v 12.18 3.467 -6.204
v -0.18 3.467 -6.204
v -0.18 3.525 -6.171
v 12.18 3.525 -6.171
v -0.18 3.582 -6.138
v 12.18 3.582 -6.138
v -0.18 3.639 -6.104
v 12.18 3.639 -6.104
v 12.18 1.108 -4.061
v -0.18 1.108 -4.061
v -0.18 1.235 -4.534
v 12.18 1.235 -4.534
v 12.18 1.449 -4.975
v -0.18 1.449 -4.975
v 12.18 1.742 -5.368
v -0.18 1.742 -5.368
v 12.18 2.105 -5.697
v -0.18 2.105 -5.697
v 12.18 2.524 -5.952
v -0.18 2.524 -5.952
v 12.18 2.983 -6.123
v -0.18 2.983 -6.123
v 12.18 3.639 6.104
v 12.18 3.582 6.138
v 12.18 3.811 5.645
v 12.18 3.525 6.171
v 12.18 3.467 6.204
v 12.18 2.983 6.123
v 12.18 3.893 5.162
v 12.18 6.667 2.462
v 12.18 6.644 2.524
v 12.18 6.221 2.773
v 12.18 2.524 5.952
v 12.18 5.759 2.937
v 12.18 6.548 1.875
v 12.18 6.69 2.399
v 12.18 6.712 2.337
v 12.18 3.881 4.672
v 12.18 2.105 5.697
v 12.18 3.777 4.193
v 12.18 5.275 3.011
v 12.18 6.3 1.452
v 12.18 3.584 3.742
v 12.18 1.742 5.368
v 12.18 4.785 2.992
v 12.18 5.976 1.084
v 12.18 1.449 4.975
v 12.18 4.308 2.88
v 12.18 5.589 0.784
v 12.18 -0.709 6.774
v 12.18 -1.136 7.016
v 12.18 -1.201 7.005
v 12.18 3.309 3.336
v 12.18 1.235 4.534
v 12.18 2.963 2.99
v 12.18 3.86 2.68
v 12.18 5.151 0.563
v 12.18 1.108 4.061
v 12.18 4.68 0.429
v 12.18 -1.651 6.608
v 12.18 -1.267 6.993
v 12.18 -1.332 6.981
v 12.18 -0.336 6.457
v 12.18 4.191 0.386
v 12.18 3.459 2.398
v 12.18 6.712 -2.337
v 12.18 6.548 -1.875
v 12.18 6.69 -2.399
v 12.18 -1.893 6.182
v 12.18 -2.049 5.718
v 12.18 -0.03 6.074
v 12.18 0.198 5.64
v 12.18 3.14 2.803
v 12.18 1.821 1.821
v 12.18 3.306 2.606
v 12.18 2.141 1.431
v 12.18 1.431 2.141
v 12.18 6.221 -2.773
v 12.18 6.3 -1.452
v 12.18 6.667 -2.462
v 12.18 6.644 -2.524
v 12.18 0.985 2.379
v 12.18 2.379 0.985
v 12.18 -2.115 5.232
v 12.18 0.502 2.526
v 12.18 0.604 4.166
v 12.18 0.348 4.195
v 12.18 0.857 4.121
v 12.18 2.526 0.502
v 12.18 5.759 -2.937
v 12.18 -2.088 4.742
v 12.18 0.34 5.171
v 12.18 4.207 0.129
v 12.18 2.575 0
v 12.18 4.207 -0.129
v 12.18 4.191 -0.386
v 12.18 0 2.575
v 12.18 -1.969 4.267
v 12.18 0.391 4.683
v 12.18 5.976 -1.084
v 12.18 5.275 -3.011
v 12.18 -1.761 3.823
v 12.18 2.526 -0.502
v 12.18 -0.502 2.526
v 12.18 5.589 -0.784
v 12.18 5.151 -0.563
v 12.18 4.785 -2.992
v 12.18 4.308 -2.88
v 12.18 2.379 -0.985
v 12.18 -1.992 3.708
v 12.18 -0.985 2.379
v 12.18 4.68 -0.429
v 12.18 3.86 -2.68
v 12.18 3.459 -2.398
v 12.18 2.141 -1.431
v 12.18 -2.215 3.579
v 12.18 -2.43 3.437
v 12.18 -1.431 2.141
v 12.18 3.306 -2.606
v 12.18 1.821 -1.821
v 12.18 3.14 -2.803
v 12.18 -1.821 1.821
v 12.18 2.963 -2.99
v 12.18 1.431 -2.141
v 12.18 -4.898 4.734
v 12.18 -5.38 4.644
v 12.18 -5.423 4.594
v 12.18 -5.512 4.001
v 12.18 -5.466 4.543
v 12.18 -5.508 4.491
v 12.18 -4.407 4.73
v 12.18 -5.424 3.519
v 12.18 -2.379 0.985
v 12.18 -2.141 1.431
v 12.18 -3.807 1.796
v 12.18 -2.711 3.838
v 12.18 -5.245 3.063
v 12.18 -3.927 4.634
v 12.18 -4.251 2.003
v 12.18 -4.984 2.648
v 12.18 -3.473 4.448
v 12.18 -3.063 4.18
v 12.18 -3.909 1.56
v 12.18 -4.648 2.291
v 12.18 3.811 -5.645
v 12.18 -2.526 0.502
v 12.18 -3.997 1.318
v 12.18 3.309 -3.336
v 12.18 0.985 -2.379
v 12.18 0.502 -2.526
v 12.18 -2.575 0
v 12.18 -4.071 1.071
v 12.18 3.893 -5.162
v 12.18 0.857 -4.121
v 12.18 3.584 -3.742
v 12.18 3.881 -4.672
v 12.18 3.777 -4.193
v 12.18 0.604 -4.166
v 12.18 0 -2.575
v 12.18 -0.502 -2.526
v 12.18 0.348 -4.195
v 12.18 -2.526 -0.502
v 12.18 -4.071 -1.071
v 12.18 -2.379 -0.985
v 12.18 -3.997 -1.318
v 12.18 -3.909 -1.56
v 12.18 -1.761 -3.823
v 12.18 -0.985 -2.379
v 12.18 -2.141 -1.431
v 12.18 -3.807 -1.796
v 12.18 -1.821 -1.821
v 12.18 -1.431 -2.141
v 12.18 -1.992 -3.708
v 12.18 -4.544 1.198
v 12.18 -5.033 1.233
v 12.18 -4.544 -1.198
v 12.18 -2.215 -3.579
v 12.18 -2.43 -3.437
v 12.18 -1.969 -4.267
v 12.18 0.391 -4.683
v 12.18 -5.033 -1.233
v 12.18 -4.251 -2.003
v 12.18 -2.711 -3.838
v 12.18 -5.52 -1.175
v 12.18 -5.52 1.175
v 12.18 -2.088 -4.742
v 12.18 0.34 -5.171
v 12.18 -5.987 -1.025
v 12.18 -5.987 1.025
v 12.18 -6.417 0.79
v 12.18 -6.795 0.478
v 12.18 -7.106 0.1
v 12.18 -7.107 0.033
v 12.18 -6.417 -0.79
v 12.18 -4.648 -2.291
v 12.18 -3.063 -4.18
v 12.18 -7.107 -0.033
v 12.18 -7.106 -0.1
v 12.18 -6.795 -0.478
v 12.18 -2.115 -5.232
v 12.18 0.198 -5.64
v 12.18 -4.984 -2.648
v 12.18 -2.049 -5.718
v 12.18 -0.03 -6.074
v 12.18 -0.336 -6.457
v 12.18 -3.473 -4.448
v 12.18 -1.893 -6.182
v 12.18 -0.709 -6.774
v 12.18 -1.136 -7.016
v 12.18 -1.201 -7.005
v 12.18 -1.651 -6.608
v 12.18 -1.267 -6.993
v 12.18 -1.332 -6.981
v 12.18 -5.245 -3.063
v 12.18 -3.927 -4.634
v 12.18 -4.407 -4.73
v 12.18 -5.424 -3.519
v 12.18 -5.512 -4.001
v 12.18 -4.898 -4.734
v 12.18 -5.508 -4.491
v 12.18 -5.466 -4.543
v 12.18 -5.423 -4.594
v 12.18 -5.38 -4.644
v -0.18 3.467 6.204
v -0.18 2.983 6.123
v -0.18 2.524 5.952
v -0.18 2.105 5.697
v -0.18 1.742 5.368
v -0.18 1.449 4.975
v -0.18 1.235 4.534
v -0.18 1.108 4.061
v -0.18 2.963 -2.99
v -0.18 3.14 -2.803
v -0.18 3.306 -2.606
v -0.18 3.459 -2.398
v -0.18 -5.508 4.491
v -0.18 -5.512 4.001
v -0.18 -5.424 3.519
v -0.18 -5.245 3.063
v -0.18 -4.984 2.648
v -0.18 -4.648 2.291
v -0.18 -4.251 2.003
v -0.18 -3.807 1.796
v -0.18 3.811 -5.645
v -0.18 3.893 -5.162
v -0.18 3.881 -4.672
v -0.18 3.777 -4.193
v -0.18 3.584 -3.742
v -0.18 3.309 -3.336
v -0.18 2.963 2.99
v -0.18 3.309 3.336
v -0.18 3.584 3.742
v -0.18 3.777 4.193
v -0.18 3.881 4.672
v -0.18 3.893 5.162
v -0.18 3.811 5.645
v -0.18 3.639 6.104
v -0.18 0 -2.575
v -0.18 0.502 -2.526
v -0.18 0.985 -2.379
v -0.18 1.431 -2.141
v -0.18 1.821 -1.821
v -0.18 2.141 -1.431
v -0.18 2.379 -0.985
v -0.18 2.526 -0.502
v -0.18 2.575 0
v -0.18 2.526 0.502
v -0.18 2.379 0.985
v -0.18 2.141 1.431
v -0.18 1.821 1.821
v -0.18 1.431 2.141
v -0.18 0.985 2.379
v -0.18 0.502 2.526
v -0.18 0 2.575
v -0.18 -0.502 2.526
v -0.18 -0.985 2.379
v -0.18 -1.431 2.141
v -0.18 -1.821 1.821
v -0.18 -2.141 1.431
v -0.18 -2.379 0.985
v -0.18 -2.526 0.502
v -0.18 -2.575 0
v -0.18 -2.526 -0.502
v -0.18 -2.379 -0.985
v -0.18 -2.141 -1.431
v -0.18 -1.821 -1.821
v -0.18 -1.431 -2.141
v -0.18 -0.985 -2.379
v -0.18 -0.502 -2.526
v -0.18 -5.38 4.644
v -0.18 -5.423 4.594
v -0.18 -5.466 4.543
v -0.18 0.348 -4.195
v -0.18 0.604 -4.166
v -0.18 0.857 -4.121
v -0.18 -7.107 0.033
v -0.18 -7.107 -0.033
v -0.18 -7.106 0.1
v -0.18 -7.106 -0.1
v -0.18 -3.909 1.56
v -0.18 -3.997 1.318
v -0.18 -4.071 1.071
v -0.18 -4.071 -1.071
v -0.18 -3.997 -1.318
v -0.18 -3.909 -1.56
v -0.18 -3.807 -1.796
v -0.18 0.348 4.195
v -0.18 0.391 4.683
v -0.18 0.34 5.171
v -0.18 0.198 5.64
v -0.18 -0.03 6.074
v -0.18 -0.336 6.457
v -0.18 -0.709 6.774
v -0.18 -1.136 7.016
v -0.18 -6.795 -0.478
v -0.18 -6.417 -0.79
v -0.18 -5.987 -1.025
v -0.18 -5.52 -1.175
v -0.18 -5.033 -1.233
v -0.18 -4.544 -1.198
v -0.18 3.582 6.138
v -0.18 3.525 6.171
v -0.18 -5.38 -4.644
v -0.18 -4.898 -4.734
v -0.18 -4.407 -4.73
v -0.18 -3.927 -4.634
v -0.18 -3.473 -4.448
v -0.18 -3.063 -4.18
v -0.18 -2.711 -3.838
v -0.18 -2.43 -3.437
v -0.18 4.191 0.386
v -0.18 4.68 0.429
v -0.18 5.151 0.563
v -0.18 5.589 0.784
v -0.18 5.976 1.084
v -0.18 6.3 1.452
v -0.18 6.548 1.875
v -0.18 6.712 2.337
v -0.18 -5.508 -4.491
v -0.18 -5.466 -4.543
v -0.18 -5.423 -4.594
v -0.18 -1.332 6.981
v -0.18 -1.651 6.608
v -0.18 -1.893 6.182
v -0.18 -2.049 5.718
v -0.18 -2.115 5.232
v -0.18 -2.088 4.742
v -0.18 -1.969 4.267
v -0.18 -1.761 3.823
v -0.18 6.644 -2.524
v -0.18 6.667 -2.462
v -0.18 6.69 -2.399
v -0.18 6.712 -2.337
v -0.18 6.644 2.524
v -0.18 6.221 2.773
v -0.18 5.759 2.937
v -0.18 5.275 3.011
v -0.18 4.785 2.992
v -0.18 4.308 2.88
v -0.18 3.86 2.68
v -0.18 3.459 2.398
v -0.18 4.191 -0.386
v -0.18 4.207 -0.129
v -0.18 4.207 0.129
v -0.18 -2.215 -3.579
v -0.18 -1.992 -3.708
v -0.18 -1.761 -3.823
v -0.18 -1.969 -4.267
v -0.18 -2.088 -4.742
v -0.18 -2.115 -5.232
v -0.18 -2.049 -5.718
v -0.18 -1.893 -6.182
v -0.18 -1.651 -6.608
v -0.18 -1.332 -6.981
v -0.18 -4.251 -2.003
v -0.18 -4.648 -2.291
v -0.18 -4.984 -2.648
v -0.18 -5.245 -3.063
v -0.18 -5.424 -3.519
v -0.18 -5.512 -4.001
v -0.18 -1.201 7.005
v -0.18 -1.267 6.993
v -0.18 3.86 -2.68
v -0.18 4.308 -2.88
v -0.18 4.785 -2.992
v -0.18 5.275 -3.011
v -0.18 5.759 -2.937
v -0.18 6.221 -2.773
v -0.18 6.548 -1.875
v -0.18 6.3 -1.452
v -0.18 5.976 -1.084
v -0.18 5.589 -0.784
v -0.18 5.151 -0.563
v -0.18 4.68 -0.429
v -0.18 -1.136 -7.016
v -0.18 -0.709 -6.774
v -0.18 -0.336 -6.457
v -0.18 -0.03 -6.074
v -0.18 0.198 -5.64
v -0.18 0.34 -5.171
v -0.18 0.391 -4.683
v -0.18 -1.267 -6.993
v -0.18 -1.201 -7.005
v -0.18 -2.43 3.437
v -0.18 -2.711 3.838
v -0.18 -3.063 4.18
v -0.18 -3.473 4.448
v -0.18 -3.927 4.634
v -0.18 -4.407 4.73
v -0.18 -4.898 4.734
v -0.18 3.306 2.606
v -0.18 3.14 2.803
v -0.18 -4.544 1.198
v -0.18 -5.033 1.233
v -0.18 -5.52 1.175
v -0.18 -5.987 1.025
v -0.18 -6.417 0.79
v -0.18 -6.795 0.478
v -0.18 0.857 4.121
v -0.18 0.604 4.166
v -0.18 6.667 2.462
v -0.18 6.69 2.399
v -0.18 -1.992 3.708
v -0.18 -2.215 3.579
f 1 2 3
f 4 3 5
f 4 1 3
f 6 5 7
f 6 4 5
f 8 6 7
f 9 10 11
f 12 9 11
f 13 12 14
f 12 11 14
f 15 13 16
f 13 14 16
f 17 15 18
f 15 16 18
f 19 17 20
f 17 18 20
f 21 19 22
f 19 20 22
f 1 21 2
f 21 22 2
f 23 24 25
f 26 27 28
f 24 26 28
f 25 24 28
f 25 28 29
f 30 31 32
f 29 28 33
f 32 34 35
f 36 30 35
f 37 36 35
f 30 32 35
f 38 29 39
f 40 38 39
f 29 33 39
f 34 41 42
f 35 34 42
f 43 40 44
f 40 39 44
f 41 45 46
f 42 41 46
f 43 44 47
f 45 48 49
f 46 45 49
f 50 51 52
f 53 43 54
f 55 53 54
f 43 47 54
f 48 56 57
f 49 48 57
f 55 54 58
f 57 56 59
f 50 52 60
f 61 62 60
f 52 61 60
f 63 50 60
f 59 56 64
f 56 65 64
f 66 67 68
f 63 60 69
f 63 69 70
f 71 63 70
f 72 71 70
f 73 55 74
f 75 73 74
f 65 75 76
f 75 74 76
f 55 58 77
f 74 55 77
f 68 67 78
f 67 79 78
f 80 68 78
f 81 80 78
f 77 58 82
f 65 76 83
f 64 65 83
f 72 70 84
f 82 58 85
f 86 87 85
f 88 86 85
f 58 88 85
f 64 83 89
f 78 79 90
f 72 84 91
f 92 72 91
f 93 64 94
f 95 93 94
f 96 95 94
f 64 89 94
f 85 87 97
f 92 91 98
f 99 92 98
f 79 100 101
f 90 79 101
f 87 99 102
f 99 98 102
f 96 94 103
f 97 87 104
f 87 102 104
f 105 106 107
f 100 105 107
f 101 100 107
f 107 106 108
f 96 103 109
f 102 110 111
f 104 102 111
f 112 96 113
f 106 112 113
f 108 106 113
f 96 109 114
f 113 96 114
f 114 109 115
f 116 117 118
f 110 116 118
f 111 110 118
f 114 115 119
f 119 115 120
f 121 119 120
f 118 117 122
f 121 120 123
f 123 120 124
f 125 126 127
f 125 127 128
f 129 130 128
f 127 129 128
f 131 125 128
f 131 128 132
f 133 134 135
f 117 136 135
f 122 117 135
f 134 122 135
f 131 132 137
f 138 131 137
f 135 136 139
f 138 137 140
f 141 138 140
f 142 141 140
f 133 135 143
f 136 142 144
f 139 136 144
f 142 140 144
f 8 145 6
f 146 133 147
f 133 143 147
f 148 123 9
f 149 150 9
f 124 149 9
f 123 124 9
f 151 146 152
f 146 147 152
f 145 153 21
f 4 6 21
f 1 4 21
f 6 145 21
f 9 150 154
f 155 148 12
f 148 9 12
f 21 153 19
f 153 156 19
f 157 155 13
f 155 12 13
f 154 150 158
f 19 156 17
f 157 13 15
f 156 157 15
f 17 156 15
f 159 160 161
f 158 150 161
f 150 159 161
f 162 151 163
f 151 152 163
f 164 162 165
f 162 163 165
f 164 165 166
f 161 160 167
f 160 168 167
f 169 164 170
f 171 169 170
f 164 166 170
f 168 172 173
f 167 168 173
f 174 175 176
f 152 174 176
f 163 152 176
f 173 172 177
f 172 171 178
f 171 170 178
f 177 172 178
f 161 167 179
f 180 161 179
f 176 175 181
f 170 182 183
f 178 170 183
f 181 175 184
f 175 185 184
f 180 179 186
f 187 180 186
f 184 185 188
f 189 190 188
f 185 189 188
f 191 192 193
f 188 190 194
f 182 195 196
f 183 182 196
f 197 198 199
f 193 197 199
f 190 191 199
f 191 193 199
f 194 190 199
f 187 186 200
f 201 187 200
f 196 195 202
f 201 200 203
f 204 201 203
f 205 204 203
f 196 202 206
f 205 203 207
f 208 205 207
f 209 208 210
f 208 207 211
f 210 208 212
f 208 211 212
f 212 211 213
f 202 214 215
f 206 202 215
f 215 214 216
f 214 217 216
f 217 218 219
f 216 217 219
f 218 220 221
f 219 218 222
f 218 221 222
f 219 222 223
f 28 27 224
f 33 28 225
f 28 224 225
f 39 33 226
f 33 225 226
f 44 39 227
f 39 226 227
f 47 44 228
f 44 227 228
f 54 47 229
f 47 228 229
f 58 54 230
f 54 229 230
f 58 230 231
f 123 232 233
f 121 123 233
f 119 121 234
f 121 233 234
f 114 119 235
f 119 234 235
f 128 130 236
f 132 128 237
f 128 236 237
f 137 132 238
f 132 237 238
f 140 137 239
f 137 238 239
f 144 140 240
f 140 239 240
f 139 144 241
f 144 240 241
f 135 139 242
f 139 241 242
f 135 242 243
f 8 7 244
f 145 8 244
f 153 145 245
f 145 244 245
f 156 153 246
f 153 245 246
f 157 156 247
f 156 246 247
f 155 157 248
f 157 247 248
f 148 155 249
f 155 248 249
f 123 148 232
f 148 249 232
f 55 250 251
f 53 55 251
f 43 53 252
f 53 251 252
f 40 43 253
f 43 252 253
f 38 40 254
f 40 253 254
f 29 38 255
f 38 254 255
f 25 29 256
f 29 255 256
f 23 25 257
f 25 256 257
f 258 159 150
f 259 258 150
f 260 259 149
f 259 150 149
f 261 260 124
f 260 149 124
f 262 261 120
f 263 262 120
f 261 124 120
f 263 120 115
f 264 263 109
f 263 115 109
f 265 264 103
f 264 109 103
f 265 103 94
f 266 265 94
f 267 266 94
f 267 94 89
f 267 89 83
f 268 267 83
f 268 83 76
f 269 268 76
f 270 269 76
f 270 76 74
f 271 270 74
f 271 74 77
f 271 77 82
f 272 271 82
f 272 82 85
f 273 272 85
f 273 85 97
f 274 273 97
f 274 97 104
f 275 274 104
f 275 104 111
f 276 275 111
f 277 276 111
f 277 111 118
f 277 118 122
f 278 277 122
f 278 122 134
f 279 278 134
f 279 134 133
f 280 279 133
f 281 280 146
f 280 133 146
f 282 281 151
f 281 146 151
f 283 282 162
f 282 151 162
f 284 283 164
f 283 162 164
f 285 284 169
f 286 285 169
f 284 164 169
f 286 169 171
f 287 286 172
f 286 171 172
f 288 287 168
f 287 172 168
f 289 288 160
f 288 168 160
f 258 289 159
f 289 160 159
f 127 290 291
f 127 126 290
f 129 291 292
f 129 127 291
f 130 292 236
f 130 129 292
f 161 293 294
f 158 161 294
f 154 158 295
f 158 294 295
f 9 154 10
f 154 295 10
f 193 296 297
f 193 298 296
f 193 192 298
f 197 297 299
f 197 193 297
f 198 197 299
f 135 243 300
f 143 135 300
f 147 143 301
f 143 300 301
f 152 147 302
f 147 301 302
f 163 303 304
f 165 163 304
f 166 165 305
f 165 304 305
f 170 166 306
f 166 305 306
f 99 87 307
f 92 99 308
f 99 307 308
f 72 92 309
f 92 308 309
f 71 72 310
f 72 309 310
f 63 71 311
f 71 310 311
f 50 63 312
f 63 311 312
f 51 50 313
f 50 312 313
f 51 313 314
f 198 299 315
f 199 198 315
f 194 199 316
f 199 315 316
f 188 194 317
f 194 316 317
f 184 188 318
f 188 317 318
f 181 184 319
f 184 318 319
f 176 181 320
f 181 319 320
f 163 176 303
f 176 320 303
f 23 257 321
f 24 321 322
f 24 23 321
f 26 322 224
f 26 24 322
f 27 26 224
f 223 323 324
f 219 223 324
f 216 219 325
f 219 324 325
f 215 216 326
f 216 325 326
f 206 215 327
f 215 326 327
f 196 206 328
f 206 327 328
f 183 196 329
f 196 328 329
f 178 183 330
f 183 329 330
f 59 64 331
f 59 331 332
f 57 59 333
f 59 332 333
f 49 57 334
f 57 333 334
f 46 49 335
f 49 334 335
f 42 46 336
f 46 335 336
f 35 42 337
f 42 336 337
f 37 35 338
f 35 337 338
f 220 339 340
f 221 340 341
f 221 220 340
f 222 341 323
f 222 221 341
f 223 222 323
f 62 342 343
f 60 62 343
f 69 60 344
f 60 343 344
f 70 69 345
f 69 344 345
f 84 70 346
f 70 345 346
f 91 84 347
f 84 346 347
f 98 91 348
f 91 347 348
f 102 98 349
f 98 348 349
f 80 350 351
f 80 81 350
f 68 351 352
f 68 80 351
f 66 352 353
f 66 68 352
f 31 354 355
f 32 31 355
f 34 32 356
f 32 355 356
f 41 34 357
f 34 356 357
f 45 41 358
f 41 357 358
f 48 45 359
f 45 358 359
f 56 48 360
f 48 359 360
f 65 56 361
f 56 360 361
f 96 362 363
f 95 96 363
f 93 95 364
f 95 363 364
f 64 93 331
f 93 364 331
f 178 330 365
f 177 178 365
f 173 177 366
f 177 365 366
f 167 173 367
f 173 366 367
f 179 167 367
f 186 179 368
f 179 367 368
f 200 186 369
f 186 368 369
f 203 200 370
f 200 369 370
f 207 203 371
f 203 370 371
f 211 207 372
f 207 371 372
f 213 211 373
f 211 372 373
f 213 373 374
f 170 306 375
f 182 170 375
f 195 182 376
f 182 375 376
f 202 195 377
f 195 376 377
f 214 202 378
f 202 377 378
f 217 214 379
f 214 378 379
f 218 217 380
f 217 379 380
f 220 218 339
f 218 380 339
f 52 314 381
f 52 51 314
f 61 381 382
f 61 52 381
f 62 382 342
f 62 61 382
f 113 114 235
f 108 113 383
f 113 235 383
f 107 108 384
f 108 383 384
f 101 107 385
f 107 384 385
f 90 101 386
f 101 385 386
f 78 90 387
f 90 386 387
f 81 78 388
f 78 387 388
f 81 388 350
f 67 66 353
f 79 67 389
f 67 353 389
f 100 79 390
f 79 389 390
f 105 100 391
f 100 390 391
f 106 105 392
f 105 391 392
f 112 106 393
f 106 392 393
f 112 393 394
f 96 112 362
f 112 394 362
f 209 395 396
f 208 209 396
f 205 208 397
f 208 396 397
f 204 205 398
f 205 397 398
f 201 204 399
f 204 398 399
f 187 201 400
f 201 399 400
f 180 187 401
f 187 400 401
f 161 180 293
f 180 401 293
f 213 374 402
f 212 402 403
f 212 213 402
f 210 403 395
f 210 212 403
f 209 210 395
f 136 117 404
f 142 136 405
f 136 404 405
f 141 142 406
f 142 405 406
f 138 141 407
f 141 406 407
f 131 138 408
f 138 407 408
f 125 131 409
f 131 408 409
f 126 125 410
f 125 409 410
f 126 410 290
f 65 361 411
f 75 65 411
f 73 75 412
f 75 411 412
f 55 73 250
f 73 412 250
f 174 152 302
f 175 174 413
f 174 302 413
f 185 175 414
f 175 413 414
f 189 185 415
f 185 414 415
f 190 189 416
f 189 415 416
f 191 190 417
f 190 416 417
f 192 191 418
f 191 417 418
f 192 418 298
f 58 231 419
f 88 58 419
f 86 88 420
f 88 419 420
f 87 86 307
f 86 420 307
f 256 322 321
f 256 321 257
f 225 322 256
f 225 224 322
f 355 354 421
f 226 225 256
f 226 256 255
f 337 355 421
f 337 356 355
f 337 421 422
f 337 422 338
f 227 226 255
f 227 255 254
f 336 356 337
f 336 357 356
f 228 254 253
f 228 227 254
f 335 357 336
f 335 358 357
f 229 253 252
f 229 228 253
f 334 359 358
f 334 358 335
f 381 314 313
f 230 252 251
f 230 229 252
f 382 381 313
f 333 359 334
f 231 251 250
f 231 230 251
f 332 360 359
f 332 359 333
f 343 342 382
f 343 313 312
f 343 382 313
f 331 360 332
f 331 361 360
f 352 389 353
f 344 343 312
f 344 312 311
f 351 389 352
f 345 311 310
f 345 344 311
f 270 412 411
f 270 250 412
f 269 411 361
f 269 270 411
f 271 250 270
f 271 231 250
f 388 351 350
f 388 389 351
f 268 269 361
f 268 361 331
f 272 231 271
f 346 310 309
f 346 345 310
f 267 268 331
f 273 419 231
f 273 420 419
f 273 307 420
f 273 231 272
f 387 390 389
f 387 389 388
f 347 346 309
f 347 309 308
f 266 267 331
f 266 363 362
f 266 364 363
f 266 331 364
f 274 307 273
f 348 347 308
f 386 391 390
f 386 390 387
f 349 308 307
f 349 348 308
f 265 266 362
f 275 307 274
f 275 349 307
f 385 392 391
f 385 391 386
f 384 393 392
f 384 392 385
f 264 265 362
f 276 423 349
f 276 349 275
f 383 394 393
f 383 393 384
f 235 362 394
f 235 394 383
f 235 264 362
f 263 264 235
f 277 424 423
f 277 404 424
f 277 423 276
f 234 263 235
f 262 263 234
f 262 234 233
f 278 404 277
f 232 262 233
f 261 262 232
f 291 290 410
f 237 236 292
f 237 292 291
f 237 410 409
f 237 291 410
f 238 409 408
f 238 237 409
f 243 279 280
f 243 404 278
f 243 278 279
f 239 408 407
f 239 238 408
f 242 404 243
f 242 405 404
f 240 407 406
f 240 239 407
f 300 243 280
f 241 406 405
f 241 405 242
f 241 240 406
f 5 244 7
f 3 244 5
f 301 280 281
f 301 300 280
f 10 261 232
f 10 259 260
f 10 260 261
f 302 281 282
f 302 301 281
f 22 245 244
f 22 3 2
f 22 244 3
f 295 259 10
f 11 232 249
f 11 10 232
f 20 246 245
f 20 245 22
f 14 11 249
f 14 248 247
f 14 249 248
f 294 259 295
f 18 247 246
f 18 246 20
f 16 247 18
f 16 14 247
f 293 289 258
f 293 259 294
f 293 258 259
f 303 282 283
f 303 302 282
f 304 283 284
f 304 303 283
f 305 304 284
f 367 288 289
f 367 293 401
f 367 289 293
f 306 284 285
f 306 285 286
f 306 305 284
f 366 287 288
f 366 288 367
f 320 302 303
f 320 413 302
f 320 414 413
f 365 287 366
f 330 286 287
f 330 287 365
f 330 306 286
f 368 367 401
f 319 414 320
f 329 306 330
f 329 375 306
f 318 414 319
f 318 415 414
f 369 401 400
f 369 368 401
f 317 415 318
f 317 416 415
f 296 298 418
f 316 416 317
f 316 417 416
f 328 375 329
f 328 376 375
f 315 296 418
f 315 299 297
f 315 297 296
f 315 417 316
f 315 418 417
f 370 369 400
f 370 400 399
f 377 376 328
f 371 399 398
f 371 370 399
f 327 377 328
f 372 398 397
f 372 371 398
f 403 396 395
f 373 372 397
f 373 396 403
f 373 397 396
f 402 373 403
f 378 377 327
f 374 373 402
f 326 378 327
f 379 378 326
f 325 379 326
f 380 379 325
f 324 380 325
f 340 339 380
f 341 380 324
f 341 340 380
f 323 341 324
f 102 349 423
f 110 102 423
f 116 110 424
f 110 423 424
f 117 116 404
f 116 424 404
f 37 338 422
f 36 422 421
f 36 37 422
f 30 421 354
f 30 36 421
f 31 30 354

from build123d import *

# Parameters (mm, degrees)
BASPROSKE_W              = 12
BASPROSKE_H              = 6.9
TOOTHCUT_DEPTH           = 16.466738506
PATTERN_CIRCULAR_1_COUNT = 9
SKETCH_1_R               = 2.5
CUT_EXTRUDE_1_DEPTH      = 16.427377744
SCALE_1_SCALE            = 1.03


with BuildPart() as part:
    # BasProSke → Base-Revolve (revolve)
    with BuildSketch(Plane(origin=(0, 0, 0), x_dir=(1, 0, 0), z_dir=(0, 1, 0)), mode=Mode.PRIVATE) as base_revolve_sk:
        with Locations((6, 3.45)):
            Rectangle(BASPROSKE_W, BASPROSKE_H)
    revolve(base_revolve_sk.sketch.rotate(Axis((-10, 0, 0), (1, 0, 0)), 180), axis=Axis((-10, 0, 0), (1, 0, 0)))

    # TooCutSke → ToothCut (cut, through all)
    with BuildSketch(Plane(origin=(0, 0, 0), x_dir=(0, 0, -1), z_dir=(1, 0, 0))):
        with BuildLine():
            ThreePointArc((0.374882812, 4.069268377), (0, 4.0865), (-0.374882812, 4.069268377))
            ThreePointArc((-0.374882812, 4.069268377), (-0.912200879, 5.63954288), (-2.314462256, 6.527312978))
            ThreePointArc((-2.314462256, 6.527312978), (0, 6.9255), (2.314462256, 6.527312978))
            ThreePointArc((2.314462256, 6.527312978), (0.912200879, 5.63954288), (0.374882812, 4.069268377))
        make_face()
    toothcut = extrude(amount=TOOTHCUT_DEPTH, mode=Mode.SUBTRACT)

    # Круговой массив1: ToothCut ×9 about axis
    pattern_circular_1_axis = Axis((0, 0, 0), (1, 0, 0))
    for i in range(1, PATTERN_CIRCULAR_1_COUNT):
        add(toothcut.rotate(pattern_circular_1_axis, i * 360 / PATTERN_CIRCULAR_1_COUNT), mode=Mode.SUBTRACT)

    # Эскиз1 → Вырез-Вытянуть1 (cut, through all)
    with BuildSketch(Plane(origin=(12, 0, 0), x_dir=(0, 0, -1), z_dir=(1, 0, 0))):
        Circle(SKETCH_1_R)
    extrude(amount=-CUT_EXTRUDE_1_DEPTH, mode=Mode.SUBTRACT)


with BuildPart() as part_1:
    # Масштаб1: scaled about (6, 0, 0)
    add(part.part.scale(SCALE_1_SCALE).moved(Location((-0.18, 0, 0))))


solid = part_1.part
